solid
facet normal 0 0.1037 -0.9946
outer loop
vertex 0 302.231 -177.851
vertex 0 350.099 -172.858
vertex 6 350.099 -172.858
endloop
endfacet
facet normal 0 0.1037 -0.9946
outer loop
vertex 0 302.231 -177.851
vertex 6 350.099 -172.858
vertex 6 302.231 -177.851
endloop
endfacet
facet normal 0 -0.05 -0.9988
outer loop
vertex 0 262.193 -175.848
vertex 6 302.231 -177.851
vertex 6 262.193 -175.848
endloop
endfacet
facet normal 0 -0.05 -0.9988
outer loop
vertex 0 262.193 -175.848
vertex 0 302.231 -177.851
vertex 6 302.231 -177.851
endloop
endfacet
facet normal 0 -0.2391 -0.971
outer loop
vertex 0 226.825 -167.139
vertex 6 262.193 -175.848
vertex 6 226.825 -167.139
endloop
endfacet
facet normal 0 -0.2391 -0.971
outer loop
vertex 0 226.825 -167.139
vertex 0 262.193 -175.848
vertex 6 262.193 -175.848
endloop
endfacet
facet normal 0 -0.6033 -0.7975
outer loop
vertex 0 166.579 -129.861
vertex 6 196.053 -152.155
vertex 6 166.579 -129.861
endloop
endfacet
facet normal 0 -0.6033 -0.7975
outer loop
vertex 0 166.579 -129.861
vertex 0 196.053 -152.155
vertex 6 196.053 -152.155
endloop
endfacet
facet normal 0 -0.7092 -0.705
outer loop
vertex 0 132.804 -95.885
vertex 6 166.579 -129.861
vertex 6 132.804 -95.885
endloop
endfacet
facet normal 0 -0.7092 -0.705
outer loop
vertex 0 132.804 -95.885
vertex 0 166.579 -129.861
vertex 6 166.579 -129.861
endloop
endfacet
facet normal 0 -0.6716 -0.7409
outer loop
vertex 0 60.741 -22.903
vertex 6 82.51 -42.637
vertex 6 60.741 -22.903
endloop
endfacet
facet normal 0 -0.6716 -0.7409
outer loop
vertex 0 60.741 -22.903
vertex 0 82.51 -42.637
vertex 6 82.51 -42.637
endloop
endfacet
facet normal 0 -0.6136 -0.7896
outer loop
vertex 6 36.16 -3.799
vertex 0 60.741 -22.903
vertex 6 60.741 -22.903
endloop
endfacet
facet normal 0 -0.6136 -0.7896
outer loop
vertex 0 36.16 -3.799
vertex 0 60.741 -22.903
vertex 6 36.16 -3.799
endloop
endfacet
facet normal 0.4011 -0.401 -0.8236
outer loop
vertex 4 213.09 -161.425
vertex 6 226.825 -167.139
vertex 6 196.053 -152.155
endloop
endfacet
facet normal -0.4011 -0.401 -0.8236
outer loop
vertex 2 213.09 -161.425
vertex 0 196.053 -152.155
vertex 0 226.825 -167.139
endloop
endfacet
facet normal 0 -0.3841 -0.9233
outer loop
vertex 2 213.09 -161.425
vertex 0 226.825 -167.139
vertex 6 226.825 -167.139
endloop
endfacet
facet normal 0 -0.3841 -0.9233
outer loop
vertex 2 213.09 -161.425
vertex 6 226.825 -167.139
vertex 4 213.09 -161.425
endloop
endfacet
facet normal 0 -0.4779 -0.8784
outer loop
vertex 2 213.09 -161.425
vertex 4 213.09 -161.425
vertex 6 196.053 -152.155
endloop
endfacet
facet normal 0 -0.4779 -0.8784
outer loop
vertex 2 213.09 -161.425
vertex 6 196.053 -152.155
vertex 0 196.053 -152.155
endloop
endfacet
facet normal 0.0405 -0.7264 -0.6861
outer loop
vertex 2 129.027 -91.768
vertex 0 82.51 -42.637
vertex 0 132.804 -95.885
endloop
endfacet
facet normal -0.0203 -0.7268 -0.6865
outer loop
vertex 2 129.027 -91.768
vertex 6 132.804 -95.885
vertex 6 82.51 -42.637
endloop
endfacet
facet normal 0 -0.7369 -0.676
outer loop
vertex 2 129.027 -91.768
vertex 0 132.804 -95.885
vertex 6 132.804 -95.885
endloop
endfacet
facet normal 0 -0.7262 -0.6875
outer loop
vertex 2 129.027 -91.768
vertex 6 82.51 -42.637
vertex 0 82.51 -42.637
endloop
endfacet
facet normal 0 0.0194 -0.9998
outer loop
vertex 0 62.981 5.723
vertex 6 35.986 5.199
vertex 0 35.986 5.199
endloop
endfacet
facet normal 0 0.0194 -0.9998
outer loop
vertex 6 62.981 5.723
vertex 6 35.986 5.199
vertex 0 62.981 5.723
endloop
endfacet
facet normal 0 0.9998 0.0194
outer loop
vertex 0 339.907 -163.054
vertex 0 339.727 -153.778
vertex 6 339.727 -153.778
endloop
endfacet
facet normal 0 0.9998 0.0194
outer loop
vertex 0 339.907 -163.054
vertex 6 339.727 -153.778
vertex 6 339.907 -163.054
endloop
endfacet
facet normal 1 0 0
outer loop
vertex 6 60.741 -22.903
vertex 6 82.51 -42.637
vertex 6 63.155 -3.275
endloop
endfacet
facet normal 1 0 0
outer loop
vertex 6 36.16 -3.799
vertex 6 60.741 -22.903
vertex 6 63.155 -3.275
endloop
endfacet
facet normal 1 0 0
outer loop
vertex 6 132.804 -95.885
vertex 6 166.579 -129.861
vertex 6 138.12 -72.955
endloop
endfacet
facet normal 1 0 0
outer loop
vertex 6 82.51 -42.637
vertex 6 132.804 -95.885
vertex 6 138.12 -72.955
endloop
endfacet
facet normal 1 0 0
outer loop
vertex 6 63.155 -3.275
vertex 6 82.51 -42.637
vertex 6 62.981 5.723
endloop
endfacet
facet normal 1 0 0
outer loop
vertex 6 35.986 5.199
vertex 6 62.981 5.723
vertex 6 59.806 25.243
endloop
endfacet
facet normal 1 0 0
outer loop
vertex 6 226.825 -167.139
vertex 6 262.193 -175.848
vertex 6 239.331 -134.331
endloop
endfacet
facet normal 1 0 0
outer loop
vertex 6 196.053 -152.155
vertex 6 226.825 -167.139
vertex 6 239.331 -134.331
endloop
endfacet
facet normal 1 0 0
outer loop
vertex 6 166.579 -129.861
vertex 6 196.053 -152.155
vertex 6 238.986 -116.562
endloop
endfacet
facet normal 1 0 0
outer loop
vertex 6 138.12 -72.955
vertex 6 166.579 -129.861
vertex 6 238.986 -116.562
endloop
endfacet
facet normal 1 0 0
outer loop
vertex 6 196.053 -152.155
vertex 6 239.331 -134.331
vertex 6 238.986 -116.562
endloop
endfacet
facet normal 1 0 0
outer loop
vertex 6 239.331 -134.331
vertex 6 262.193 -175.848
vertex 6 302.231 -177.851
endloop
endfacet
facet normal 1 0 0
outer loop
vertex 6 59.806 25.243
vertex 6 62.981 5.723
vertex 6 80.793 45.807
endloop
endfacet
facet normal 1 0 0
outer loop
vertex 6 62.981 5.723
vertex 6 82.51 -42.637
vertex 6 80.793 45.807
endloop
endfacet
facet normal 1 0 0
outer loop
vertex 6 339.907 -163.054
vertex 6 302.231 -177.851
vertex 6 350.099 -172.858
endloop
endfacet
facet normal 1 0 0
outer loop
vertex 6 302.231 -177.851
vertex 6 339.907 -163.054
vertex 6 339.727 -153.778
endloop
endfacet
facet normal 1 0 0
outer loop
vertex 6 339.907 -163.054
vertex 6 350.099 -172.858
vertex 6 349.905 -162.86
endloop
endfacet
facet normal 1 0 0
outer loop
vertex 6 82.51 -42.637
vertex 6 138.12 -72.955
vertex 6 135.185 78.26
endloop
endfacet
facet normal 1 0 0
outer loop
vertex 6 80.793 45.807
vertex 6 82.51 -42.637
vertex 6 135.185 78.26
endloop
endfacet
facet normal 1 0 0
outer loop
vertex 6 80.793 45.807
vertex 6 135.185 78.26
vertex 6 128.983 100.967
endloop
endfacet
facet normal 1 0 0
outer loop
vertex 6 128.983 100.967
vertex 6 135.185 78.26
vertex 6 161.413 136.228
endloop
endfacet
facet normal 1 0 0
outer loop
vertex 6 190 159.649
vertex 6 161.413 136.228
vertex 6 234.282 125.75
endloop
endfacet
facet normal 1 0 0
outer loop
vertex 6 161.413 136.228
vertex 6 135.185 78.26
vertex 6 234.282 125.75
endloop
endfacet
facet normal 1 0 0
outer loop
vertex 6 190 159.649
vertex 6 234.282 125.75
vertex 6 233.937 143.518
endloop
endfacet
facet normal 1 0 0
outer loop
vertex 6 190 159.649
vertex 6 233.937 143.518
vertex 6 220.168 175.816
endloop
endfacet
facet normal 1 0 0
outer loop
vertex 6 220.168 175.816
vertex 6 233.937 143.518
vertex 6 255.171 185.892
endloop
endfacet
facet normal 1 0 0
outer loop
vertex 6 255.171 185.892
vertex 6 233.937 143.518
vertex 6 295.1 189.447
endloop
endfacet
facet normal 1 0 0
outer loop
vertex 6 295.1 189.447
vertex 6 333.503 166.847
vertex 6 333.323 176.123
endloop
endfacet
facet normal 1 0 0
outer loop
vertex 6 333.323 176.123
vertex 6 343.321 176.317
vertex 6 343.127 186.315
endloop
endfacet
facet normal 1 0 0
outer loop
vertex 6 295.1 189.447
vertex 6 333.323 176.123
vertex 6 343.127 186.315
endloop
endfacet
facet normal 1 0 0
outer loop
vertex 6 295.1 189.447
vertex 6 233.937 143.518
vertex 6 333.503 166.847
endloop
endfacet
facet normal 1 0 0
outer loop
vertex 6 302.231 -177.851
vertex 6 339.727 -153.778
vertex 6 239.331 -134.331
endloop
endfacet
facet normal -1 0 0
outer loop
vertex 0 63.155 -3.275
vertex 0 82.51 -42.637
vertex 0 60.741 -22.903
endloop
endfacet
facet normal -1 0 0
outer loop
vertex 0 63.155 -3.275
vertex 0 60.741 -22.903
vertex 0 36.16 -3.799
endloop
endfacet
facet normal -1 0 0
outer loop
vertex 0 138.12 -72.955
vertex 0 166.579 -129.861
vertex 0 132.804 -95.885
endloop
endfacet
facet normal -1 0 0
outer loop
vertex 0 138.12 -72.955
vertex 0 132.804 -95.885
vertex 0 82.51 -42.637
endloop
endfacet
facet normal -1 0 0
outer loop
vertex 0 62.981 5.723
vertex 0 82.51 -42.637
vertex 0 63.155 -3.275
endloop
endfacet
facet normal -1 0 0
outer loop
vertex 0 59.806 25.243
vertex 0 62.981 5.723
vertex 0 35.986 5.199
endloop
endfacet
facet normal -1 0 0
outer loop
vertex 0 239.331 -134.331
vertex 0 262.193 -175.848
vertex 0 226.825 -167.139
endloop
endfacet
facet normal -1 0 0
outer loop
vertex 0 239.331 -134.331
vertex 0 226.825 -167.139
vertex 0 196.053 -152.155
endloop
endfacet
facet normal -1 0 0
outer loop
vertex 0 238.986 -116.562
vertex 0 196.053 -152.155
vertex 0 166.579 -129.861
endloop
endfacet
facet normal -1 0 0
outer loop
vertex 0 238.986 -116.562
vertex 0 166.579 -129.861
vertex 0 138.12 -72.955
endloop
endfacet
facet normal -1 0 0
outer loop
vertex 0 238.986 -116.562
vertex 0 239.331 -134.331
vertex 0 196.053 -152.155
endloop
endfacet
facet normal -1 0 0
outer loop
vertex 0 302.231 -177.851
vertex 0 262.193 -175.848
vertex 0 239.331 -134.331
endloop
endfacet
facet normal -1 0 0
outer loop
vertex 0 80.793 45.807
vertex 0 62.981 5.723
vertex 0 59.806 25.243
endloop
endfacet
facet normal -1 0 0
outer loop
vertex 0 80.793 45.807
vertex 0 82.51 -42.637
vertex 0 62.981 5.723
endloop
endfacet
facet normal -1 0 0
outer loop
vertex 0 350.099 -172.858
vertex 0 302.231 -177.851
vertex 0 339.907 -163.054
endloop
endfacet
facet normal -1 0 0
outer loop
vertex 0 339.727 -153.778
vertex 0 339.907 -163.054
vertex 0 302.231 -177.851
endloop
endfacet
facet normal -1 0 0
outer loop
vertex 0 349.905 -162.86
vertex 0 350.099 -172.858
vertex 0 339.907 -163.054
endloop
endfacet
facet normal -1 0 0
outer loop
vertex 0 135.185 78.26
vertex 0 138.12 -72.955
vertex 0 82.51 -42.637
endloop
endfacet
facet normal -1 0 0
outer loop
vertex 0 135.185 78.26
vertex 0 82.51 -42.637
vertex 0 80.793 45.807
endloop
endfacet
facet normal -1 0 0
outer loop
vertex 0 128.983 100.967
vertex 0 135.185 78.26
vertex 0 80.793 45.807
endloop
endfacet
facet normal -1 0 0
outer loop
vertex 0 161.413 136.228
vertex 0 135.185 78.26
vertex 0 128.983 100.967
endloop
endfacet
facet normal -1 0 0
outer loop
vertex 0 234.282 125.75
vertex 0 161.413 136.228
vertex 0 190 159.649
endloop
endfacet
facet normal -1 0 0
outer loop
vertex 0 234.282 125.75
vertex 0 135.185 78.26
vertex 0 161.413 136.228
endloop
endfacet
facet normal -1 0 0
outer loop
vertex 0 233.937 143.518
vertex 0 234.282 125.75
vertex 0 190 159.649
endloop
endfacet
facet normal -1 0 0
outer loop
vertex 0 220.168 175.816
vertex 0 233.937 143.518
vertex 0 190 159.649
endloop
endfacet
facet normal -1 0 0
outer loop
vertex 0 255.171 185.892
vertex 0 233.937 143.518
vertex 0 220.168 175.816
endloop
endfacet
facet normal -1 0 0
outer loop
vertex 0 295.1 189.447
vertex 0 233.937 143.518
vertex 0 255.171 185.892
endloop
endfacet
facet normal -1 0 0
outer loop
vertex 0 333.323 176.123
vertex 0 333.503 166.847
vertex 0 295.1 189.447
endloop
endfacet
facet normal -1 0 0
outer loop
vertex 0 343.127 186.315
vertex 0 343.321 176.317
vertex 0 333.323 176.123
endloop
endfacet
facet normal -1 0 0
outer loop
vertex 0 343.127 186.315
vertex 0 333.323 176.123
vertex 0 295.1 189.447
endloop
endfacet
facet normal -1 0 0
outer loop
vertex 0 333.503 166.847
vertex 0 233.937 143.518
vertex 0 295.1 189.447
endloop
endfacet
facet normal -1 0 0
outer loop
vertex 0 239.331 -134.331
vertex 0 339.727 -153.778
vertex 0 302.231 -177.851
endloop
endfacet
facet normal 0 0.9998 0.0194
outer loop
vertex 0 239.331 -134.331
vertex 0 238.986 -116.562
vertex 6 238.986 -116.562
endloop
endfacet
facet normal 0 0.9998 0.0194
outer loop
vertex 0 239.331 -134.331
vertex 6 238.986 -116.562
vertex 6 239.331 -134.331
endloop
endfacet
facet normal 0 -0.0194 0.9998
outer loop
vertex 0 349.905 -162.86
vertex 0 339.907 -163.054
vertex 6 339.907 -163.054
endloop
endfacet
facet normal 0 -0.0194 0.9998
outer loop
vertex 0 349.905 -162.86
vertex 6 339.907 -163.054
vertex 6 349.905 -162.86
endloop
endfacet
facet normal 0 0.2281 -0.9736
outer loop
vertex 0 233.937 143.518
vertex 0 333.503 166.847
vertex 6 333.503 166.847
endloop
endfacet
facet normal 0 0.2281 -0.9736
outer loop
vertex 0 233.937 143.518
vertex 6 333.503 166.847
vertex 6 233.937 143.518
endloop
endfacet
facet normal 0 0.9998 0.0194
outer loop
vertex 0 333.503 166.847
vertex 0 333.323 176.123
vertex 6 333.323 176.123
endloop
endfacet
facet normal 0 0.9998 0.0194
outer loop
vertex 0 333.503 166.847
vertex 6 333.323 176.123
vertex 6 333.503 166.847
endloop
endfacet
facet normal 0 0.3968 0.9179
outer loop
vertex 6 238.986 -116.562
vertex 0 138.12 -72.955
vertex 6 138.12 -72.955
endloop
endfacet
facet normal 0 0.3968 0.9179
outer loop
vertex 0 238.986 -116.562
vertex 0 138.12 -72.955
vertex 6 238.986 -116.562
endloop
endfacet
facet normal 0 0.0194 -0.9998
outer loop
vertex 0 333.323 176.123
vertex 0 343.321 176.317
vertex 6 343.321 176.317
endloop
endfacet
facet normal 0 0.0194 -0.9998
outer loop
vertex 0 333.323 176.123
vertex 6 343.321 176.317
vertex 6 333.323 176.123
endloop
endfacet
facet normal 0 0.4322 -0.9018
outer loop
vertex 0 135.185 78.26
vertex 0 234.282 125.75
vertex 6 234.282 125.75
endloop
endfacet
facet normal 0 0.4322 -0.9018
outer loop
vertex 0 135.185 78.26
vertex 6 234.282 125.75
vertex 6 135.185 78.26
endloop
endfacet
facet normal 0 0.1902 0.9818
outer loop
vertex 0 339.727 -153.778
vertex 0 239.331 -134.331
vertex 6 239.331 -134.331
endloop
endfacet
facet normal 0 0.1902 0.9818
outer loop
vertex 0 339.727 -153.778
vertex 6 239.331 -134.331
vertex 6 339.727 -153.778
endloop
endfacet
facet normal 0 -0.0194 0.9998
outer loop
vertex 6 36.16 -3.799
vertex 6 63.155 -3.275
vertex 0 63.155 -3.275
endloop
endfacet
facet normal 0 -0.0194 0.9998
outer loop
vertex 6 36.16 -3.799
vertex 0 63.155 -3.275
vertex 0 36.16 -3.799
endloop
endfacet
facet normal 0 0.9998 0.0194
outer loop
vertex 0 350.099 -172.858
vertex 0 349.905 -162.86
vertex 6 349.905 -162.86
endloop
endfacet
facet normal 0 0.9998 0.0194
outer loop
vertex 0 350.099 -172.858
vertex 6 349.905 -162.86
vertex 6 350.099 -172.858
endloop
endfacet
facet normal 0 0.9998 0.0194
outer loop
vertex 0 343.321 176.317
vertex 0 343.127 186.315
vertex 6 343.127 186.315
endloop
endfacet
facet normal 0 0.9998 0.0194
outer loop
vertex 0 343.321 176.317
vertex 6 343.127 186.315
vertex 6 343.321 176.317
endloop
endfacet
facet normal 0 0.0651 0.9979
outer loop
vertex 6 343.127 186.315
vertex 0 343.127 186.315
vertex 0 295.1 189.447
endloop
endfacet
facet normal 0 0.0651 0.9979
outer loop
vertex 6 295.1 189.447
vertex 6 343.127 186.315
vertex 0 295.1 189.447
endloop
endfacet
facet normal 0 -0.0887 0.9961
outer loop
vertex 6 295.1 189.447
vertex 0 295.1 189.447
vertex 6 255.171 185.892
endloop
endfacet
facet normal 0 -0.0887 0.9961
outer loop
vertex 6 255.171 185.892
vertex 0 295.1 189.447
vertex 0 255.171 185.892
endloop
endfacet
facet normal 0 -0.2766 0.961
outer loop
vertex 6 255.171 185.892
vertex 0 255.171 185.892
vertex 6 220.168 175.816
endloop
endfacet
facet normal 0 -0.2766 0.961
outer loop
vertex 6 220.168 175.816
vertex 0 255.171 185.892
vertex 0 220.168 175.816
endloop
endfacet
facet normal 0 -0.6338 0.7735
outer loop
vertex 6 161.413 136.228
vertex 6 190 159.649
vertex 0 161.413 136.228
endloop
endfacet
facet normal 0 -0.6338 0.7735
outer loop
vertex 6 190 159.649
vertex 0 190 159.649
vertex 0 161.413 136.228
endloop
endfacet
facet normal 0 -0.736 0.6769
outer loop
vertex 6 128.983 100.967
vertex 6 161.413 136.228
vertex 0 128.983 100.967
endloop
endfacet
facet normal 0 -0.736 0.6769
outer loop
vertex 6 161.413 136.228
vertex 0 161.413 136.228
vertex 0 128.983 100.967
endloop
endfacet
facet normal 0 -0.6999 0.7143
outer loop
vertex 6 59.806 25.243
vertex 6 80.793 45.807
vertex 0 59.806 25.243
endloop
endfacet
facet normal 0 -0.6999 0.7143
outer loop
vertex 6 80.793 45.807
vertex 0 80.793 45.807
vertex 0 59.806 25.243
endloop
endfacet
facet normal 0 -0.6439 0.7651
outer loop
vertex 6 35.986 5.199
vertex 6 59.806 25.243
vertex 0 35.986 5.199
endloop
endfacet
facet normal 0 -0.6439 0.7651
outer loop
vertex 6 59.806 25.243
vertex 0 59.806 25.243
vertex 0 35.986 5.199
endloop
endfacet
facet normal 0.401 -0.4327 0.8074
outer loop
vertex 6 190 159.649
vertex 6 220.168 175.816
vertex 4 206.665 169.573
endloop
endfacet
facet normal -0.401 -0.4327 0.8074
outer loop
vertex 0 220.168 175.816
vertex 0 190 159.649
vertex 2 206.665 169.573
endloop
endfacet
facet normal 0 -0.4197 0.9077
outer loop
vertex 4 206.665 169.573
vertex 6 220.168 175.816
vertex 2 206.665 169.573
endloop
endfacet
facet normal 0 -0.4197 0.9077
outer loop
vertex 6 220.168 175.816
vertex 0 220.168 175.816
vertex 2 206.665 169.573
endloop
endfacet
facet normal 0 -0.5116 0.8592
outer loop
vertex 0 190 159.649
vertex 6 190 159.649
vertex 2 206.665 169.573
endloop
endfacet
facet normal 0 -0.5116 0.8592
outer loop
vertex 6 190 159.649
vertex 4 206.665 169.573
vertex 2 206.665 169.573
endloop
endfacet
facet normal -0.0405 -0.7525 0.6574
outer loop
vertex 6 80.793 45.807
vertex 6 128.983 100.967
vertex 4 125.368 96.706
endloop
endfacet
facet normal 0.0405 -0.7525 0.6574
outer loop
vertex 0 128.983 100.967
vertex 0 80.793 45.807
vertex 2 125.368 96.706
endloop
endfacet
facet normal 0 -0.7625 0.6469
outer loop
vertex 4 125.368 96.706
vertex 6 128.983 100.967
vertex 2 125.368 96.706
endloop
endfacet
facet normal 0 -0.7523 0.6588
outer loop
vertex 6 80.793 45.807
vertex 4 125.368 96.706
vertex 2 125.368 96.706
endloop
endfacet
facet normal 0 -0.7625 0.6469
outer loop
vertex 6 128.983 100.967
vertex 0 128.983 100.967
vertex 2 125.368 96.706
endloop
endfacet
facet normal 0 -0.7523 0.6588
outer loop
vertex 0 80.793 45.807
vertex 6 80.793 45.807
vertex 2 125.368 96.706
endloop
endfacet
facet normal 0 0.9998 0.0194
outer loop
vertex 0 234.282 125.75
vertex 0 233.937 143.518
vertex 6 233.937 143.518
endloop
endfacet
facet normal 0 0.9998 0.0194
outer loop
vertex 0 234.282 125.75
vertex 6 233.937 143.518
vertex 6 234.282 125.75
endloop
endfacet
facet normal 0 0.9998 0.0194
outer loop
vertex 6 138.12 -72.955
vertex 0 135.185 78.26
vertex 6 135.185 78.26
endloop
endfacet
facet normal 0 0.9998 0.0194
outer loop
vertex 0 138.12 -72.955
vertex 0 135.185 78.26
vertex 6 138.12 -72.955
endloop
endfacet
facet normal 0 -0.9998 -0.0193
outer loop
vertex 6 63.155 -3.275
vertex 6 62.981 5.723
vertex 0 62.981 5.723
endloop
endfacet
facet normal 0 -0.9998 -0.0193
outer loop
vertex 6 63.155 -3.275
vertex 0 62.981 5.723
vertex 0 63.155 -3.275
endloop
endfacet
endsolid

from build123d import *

# Parameters (mm, degrees)
BOSS_EXTRU_3_DEPTH      = 6
ENL_V_MAT_EXTRU_1_DEPTH = 6


with BuildPart() as part:
    # Esquisse2 → Boss.-Extru.3 (new body)
    with BuildSketch(Plane(origin=(0, 0, 0), x_dir=(0, 0, -1), z_dir=(1, 0, 0))):
        with BuildLine():
            Line((-186.314870475, 343.126909424), (-176.316754144, 343.320996586))
            Line((-176.316754144, 343.320996586), (-176.122666982, 333.322880254))
            Line((-176.122666982, 333.322880254), (-166.846574289, 333.502951224))
            Line((-166.846574289, 333.502951224), (-143.518291854, 233.936968303))
            Line((-143.518291854, 233.936968303), (-125.749671338, 234.281899389))
            Line((-125.749671338, 234.281899389), (-78.26041194, 135.18493836))
            Line((-78.26041194, 135.18493836), (72.954907085, 138.120386506))
            Line((72.954907085, 138.120386506), (116.562423252, 238.985752103))
            Line((116.562423252, 238.985752103), (134.331043769, 239.330683189))
            Line((134.331043769, 239.330683189), (153.777582972, 339.727026894))
            Line((153.777582972, 339.727026894), (163.053675666, 339.907097863))
            Line((163.053675666, 339.907097863), (162.859588505, 349.905214195))
            Line((162.859588505, 349.905214195), (172.857704836, 350.099301356))
            add(Edge.make_bspline(
                [(172.857704836, 350.099301356), (204.384261901, 162.8071682), (83.498136197, 153.642271532), (-0.579687579, 29.861757988)],
                knots=[0, 0, 0, 0, 1, 1, 1, 1], degree=3))
            add(Edge.make_bspline(
                [(-186.314870475, 343.126909424), (-210.548845306, 154.752332035), (-89.398104046, 150.285945261), (-0.579687579, 29.861757988)],
                knots=[0, 0, 0, 0, 1, 1, 1, 1], degree=3))
        make_face()
    extrude(amount=BOSS_EXTRU_3_DEPTH)

    # Esquisse3 → Enlèv. mat.-Extru.1 (cut)
    with BuildSketch(Plane(origin=(6, 0, 0), x_dir=(0, 0, -1), z_dir=(1, 0, 0))):
        Polygon((-5.199417696, 35.985806185), (-5.723453032, 62.98072028), (3.274851666, 63.155398725), (3.798887002, 36.160484631), (13.09005186, 25.116564572), (-12.278264547, 26.928587172), align=None)
    extrude(amount=-ENL_V_MAT_EXTRU_1_DEPTH, mode=Mode.SUBTRACT)


solid = part.part
